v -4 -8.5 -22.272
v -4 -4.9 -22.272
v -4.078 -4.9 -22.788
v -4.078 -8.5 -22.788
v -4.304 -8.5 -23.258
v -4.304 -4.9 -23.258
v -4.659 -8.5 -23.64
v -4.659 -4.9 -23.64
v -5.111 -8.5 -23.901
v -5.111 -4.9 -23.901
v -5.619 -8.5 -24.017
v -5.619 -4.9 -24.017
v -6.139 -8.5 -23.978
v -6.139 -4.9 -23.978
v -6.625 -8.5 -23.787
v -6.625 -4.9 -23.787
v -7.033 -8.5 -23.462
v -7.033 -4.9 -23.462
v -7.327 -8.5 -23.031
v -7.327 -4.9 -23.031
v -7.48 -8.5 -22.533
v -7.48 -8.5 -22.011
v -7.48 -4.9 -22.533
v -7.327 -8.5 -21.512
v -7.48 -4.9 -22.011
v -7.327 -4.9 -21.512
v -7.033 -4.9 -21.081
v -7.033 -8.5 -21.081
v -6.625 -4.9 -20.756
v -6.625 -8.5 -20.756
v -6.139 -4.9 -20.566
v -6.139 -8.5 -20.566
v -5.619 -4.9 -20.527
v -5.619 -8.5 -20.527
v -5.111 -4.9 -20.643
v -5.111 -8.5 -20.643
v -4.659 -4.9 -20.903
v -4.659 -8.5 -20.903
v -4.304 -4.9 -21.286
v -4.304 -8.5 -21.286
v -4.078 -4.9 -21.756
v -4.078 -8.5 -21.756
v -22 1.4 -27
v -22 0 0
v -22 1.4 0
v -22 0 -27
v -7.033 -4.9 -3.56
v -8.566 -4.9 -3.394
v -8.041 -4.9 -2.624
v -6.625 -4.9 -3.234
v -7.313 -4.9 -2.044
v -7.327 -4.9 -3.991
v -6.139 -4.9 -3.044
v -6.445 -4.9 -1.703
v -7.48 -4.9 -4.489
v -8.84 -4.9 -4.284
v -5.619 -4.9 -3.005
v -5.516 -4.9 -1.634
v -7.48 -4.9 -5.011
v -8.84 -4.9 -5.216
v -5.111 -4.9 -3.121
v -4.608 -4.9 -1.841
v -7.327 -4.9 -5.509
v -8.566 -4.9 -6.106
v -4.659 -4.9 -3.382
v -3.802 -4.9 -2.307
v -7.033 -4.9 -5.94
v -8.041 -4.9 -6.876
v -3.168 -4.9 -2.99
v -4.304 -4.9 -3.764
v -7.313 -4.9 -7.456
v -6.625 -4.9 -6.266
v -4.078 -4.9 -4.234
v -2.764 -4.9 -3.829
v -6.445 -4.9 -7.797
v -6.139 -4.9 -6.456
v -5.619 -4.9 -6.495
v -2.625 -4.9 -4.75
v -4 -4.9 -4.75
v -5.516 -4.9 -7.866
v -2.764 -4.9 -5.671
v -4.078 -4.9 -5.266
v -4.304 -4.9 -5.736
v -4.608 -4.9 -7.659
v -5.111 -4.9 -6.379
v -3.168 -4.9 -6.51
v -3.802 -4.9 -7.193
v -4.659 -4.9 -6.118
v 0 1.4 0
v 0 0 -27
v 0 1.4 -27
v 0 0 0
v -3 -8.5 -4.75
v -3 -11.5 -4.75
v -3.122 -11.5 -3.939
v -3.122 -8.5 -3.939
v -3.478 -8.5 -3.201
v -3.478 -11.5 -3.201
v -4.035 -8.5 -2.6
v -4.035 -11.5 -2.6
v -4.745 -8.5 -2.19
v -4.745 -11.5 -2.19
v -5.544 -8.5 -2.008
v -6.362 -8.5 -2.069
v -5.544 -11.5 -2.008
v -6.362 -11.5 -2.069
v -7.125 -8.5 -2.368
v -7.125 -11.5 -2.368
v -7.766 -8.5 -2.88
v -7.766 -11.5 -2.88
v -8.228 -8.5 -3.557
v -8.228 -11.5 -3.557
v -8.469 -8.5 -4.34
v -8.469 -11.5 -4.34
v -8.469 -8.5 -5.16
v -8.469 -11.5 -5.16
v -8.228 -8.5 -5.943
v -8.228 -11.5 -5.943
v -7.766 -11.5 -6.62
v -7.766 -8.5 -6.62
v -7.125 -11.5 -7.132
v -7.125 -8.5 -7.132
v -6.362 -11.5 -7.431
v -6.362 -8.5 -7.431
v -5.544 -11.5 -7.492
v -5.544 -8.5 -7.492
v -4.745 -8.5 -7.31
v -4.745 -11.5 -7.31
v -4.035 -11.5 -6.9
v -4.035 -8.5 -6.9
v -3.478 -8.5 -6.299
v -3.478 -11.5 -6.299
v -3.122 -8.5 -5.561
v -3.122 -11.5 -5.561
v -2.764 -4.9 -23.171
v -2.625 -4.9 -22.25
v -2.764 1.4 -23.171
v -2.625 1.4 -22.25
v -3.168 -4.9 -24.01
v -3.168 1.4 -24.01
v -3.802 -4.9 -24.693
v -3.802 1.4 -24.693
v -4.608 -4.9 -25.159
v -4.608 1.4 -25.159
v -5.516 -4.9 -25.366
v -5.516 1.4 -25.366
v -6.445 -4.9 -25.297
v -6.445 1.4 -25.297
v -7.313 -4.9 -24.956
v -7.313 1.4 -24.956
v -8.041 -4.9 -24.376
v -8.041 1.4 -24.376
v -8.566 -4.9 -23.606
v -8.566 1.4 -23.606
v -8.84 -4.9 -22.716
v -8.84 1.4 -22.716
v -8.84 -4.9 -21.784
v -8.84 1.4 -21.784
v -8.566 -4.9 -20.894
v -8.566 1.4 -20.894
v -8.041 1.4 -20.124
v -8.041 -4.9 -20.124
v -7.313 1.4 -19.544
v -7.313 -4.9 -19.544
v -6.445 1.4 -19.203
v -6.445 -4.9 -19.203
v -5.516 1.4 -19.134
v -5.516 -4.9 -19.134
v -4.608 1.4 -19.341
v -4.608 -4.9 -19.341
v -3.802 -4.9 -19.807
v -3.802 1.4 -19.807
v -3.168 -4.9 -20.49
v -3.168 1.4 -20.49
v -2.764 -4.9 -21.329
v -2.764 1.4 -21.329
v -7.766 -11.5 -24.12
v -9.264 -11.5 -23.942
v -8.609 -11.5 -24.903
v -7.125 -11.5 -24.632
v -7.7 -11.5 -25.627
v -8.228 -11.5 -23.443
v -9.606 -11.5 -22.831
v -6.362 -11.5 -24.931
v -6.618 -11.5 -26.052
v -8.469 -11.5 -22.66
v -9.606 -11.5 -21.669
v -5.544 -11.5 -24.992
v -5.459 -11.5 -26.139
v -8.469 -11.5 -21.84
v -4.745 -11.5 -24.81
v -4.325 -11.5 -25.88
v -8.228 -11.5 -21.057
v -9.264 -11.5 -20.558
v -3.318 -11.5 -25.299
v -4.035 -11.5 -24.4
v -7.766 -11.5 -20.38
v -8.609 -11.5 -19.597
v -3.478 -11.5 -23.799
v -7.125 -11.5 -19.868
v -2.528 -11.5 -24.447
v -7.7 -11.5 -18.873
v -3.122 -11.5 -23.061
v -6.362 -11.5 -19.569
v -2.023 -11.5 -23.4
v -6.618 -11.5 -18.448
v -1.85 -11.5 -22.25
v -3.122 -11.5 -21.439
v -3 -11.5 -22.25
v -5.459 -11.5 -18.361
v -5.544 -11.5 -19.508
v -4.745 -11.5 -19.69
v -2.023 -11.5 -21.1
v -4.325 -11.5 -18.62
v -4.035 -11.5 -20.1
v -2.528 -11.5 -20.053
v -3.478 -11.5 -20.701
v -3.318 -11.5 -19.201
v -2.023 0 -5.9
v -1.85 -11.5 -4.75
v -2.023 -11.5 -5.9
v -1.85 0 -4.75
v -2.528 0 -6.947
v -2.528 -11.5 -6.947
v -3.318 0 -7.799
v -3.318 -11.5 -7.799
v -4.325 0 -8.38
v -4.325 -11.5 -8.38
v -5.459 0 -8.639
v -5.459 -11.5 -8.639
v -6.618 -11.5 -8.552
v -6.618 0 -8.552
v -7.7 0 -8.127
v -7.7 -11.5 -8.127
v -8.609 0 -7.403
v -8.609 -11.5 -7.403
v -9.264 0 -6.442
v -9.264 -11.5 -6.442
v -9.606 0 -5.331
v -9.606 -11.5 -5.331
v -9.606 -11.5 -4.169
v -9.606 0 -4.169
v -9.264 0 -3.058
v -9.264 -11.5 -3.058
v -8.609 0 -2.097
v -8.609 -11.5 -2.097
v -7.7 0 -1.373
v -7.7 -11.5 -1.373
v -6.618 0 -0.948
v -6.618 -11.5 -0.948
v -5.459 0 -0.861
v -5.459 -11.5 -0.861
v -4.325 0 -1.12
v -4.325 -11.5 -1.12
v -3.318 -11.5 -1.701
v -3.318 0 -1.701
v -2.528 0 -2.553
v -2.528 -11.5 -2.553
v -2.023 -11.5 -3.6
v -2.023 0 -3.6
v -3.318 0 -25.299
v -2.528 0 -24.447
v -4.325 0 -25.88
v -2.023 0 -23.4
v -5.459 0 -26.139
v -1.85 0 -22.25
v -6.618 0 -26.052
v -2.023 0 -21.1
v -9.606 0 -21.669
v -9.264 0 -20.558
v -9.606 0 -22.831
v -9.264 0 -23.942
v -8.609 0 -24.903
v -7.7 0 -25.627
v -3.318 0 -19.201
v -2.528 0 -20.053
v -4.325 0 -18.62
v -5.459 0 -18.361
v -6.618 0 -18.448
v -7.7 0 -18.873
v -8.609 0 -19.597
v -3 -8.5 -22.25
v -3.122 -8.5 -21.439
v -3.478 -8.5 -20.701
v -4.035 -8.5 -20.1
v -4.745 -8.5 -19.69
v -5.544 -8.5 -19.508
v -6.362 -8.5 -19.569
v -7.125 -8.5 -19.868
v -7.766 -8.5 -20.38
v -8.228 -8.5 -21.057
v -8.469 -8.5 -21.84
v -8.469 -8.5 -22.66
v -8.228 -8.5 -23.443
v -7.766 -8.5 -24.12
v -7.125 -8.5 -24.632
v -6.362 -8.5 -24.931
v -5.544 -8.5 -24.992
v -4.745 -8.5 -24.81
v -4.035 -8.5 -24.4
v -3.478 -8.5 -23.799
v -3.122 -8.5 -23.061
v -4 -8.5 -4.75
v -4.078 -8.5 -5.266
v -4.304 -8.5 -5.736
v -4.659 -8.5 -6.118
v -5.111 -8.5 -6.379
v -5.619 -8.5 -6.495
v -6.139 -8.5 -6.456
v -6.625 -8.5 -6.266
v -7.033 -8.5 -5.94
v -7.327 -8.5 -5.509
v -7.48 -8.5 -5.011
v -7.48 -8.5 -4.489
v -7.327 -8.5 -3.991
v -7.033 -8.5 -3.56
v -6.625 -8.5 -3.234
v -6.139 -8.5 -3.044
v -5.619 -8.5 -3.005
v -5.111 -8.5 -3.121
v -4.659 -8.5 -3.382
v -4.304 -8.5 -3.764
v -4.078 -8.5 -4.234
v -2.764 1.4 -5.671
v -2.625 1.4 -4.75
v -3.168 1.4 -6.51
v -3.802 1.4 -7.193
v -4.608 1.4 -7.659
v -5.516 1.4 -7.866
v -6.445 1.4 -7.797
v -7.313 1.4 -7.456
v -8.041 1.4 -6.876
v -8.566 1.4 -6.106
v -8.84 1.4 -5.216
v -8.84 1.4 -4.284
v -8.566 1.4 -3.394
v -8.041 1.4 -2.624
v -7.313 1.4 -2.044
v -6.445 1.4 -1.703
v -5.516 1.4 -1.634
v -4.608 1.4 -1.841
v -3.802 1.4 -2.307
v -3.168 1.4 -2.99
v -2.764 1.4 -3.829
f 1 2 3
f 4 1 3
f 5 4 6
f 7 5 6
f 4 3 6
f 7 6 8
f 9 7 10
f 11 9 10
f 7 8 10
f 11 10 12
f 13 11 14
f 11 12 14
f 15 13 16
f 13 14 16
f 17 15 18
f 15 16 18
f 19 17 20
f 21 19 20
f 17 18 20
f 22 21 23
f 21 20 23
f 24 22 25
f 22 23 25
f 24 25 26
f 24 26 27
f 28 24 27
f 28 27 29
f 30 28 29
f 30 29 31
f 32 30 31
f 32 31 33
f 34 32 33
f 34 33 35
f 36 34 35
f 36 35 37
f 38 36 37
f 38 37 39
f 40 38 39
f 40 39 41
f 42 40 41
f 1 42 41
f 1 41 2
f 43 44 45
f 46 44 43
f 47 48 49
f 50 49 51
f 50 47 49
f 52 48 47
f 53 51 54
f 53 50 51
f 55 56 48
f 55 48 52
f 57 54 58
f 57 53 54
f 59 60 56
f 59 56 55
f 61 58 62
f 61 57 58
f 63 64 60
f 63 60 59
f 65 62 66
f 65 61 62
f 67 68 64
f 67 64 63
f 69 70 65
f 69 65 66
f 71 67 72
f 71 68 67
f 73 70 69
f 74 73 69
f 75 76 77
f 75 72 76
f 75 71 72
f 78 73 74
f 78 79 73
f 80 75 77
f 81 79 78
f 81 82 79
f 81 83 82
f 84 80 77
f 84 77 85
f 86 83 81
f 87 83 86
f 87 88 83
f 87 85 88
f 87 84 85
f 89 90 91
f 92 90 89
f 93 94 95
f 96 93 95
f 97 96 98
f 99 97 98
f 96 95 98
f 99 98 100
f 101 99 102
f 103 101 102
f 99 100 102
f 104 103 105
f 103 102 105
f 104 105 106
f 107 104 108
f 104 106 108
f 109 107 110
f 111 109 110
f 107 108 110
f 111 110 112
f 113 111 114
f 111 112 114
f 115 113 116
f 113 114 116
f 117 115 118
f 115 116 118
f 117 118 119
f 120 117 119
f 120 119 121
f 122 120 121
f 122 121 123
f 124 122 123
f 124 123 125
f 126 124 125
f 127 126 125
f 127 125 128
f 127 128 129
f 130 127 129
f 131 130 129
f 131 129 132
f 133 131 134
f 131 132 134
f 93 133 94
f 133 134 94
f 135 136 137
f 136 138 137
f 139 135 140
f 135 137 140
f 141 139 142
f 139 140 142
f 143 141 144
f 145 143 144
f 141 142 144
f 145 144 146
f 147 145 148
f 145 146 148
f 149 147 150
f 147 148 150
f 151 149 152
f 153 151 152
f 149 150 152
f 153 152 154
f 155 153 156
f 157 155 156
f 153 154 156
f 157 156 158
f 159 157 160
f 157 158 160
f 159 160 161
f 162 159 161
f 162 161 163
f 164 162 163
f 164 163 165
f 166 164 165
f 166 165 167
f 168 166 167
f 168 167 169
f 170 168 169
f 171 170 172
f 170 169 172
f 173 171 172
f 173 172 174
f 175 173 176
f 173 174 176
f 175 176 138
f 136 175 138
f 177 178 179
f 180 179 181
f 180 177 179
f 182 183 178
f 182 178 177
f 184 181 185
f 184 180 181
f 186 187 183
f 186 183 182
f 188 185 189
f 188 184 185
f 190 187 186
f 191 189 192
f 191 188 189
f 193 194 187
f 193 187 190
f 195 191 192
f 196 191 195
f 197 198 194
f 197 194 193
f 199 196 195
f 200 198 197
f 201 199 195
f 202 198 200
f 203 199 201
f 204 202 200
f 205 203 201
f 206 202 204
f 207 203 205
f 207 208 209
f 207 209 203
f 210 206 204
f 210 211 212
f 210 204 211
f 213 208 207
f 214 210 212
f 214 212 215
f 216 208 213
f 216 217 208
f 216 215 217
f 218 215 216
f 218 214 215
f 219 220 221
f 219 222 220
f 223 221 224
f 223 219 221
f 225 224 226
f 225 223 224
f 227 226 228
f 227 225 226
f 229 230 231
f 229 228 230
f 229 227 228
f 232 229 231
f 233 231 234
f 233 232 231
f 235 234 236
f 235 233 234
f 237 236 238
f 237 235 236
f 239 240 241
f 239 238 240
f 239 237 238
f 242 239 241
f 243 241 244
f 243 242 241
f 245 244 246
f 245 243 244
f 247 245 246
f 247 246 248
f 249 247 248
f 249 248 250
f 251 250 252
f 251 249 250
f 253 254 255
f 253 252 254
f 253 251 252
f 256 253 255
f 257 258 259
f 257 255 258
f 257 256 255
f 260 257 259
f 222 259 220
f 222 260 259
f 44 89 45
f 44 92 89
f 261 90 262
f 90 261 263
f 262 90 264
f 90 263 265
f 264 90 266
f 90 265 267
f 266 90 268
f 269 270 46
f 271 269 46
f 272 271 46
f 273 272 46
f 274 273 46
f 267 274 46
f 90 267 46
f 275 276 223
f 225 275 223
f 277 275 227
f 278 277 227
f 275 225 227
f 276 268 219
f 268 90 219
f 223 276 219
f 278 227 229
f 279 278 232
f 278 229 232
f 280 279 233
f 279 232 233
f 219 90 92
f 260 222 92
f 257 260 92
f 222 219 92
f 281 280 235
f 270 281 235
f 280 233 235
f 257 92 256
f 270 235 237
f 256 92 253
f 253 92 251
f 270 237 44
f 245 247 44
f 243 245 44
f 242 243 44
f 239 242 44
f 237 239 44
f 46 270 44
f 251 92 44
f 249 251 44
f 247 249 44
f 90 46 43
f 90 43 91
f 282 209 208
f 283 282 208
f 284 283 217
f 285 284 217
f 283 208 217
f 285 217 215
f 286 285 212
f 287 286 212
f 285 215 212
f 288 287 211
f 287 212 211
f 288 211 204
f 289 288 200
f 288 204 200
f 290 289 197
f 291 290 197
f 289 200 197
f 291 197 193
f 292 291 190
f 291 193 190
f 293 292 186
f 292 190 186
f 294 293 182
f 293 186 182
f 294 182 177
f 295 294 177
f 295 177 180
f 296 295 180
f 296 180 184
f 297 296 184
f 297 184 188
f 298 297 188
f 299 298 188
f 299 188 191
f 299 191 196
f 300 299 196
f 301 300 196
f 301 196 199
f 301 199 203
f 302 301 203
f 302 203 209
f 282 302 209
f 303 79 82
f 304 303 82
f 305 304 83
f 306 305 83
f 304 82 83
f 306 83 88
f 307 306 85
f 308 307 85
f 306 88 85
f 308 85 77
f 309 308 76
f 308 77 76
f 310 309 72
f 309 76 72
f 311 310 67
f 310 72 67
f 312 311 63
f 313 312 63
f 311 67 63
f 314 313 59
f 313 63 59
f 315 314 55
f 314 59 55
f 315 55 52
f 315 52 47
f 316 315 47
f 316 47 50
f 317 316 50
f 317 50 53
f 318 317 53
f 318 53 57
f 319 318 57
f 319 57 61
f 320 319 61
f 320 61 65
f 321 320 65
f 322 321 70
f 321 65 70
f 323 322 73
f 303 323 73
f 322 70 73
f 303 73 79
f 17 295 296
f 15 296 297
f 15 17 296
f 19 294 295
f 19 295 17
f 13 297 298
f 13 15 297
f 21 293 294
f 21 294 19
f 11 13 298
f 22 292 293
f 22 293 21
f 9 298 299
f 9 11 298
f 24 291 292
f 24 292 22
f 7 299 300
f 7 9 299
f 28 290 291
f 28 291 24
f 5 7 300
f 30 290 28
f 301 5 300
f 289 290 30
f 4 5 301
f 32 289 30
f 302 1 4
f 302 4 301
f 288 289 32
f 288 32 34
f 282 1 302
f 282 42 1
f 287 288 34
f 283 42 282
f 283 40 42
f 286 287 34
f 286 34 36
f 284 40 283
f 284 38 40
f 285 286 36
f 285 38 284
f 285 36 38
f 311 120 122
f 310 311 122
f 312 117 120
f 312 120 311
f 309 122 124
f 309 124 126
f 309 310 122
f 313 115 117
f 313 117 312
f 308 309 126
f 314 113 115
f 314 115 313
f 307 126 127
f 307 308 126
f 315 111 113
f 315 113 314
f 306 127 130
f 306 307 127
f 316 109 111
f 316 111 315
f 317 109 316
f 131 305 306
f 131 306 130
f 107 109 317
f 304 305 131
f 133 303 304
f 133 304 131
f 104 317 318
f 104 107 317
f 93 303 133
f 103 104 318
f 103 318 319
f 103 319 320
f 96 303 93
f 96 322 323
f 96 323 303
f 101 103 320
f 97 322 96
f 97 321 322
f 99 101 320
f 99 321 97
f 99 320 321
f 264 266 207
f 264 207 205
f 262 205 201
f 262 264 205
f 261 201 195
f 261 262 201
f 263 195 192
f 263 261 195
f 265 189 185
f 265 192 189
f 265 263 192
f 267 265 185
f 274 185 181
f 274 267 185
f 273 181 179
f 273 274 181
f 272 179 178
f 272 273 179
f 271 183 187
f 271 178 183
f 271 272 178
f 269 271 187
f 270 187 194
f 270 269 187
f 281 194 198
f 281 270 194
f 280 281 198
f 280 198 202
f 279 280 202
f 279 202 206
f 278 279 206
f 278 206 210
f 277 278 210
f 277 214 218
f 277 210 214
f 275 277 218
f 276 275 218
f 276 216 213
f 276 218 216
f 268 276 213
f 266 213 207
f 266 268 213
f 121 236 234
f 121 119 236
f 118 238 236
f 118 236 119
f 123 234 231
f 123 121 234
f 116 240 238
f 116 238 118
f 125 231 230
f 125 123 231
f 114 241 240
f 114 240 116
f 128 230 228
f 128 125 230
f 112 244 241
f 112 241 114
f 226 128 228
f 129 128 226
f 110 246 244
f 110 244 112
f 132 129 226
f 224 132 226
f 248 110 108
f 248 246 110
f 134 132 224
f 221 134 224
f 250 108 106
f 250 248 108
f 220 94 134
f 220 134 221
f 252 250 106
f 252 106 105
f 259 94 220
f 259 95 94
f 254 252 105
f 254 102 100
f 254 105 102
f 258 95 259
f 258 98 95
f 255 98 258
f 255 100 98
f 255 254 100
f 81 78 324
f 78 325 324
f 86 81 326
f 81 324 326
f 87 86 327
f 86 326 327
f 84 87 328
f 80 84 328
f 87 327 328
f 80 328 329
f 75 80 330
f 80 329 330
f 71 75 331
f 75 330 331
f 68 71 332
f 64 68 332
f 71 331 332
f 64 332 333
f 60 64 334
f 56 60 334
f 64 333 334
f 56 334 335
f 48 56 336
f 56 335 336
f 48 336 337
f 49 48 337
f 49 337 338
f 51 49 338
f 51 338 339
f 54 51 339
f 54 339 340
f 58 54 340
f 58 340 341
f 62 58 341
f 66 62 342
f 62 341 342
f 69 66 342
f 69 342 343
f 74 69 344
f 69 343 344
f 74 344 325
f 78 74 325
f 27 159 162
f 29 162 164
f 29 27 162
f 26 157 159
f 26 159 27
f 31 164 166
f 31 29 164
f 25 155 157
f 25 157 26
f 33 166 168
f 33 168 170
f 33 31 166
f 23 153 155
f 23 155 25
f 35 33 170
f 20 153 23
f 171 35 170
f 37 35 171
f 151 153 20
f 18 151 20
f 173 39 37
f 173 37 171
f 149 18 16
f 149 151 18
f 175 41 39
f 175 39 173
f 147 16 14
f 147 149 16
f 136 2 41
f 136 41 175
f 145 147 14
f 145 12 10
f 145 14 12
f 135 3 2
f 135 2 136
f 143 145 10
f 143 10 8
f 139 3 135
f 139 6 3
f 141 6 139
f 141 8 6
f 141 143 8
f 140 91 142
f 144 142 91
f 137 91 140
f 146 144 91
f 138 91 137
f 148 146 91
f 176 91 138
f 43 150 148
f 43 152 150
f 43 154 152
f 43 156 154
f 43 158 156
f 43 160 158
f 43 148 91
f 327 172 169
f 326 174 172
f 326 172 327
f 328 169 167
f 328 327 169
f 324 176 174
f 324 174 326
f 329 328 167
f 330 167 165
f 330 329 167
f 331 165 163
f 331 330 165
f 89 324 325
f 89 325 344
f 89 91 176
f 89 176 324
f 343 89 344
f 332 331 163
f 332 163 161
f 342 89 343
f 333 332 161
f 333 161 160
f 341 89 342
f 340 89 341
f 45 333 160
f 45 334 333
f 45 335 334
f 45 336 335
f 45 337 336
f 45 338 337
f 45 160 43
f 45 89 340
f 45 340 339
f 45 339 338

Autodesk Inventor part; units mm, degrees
ref_plane "YZ Plane" through (0, 0, 0) normal (1, 0, 0) x (0, 1, 0)
ref_plane "XZ Plane" through (0, 0, 0) normal (0, 1, 0) x (-1, 0, 0)
ref_plane "XY Plane" through (0, 0, 0) normal (0, 0, 1) x (1, 0, 0)
sketch "Эскиз1" plane through (0, 0, 0) normal (0, 1, 0) x (-1, 0, 0)
  line L0 (0, 0) -> (22, 0)
  line L1 (22, 0) -> (22, -27)
  line L2 (22, -27) -> (0, -27)
  line L3 (0, -27) -> (0, 0)
  dimension "d0" = 22
  dimension "d1" = 27
extrude "Выдавливание1" add sketch "Эскиз1" along normal blind 1.4
sketch "Эскиз2" plane through (0, 0, 0) normal (0, -1, 0) x (1, 0, 0)
  circle A0 centre (-5.75, -4.75) radius 3.9
  circle A1 centre (-5.75, -22.25) radius 3.9
  line L0 (-22, 0) -> (0, 0) projected
  line L1 (0, 0) -> (0, -27) projected
  line L2 (0, -27) -> (-22, -27) projected
  dimension "d4" = 7.8
  dimension "d5" = 7.8
  dimension "d6" = 4.75
  dimension "d7" = 5.75
  dimension "d8" = 5.75
  dimension "d9" = 4.75
extrude "Выдавливание2" add sketch "Эскиз2" along normal blind 11.5
sketch "Эскиз3" plane through (-5.75, -11.5, -22.25) normal (0, -1, 0) x (1, 0, 0)
  circle A0 centre (0, 0) radius 2.75
  point P0 (5.75, 22.25)
  dimension "d12" = 5.5
extrude "Выдавливание3" cut sketch "Эскиз3" against normal blind 3
sketch "Эскиз4" plane through (-5.75, -11.5, -4.75) normal (0, -1, 0) x (1, 0, 0)
  circle A0 centre (0, 0) radius 2.75
  point P0 (5.75, 4.75)
  dimension "d13" = 5.5
extrude "Выдавливание4" cut sketch "Эскиз4" against normal blind 3
sketch "Эскиз5" plane through (0, 1.4, 0) normal (0, 1, 0) x (1, 0, 0)
  circle A0 centre (-5.75, 4.75) radius 3.9 projected
  circle A1 centre (-5.75, 4.75) radius 1.75
  circle A2 centre (-5.75, 22.2717) radius 1.75
  point P0 (0, 0)
  dimension "d20" = 3.5
  dimension "d21" = 3.5
extrude "Выдавливание5" cut sketch "Эскиз5" against normal blind 11.5 contours A1 | A2
sketch "Эскиз6" plane through (0, 1.4, 0) normal (0, 1, 0) x (1, 0, 0)
  circle A0 centre (-5.75, 4.75) radius 2.75 projected
  circle A1 centre (-5.75, 4.75) radius 3.125
  circle A2 centre (-5.75, 22.25) radius 2.75 projected
  circle A3 centre (-5.75, 22.25) radius 3.125
  point P0 (0, 0)
  dimension "d24" = 6.25
  dimension "d25" = 6.25
extrude "Выдавливание6" cut sketch "Эскиз6" against normal blind 6.3 contours A0 | A1 | A2 | A3
properties part number "Крышка для клеммы"
